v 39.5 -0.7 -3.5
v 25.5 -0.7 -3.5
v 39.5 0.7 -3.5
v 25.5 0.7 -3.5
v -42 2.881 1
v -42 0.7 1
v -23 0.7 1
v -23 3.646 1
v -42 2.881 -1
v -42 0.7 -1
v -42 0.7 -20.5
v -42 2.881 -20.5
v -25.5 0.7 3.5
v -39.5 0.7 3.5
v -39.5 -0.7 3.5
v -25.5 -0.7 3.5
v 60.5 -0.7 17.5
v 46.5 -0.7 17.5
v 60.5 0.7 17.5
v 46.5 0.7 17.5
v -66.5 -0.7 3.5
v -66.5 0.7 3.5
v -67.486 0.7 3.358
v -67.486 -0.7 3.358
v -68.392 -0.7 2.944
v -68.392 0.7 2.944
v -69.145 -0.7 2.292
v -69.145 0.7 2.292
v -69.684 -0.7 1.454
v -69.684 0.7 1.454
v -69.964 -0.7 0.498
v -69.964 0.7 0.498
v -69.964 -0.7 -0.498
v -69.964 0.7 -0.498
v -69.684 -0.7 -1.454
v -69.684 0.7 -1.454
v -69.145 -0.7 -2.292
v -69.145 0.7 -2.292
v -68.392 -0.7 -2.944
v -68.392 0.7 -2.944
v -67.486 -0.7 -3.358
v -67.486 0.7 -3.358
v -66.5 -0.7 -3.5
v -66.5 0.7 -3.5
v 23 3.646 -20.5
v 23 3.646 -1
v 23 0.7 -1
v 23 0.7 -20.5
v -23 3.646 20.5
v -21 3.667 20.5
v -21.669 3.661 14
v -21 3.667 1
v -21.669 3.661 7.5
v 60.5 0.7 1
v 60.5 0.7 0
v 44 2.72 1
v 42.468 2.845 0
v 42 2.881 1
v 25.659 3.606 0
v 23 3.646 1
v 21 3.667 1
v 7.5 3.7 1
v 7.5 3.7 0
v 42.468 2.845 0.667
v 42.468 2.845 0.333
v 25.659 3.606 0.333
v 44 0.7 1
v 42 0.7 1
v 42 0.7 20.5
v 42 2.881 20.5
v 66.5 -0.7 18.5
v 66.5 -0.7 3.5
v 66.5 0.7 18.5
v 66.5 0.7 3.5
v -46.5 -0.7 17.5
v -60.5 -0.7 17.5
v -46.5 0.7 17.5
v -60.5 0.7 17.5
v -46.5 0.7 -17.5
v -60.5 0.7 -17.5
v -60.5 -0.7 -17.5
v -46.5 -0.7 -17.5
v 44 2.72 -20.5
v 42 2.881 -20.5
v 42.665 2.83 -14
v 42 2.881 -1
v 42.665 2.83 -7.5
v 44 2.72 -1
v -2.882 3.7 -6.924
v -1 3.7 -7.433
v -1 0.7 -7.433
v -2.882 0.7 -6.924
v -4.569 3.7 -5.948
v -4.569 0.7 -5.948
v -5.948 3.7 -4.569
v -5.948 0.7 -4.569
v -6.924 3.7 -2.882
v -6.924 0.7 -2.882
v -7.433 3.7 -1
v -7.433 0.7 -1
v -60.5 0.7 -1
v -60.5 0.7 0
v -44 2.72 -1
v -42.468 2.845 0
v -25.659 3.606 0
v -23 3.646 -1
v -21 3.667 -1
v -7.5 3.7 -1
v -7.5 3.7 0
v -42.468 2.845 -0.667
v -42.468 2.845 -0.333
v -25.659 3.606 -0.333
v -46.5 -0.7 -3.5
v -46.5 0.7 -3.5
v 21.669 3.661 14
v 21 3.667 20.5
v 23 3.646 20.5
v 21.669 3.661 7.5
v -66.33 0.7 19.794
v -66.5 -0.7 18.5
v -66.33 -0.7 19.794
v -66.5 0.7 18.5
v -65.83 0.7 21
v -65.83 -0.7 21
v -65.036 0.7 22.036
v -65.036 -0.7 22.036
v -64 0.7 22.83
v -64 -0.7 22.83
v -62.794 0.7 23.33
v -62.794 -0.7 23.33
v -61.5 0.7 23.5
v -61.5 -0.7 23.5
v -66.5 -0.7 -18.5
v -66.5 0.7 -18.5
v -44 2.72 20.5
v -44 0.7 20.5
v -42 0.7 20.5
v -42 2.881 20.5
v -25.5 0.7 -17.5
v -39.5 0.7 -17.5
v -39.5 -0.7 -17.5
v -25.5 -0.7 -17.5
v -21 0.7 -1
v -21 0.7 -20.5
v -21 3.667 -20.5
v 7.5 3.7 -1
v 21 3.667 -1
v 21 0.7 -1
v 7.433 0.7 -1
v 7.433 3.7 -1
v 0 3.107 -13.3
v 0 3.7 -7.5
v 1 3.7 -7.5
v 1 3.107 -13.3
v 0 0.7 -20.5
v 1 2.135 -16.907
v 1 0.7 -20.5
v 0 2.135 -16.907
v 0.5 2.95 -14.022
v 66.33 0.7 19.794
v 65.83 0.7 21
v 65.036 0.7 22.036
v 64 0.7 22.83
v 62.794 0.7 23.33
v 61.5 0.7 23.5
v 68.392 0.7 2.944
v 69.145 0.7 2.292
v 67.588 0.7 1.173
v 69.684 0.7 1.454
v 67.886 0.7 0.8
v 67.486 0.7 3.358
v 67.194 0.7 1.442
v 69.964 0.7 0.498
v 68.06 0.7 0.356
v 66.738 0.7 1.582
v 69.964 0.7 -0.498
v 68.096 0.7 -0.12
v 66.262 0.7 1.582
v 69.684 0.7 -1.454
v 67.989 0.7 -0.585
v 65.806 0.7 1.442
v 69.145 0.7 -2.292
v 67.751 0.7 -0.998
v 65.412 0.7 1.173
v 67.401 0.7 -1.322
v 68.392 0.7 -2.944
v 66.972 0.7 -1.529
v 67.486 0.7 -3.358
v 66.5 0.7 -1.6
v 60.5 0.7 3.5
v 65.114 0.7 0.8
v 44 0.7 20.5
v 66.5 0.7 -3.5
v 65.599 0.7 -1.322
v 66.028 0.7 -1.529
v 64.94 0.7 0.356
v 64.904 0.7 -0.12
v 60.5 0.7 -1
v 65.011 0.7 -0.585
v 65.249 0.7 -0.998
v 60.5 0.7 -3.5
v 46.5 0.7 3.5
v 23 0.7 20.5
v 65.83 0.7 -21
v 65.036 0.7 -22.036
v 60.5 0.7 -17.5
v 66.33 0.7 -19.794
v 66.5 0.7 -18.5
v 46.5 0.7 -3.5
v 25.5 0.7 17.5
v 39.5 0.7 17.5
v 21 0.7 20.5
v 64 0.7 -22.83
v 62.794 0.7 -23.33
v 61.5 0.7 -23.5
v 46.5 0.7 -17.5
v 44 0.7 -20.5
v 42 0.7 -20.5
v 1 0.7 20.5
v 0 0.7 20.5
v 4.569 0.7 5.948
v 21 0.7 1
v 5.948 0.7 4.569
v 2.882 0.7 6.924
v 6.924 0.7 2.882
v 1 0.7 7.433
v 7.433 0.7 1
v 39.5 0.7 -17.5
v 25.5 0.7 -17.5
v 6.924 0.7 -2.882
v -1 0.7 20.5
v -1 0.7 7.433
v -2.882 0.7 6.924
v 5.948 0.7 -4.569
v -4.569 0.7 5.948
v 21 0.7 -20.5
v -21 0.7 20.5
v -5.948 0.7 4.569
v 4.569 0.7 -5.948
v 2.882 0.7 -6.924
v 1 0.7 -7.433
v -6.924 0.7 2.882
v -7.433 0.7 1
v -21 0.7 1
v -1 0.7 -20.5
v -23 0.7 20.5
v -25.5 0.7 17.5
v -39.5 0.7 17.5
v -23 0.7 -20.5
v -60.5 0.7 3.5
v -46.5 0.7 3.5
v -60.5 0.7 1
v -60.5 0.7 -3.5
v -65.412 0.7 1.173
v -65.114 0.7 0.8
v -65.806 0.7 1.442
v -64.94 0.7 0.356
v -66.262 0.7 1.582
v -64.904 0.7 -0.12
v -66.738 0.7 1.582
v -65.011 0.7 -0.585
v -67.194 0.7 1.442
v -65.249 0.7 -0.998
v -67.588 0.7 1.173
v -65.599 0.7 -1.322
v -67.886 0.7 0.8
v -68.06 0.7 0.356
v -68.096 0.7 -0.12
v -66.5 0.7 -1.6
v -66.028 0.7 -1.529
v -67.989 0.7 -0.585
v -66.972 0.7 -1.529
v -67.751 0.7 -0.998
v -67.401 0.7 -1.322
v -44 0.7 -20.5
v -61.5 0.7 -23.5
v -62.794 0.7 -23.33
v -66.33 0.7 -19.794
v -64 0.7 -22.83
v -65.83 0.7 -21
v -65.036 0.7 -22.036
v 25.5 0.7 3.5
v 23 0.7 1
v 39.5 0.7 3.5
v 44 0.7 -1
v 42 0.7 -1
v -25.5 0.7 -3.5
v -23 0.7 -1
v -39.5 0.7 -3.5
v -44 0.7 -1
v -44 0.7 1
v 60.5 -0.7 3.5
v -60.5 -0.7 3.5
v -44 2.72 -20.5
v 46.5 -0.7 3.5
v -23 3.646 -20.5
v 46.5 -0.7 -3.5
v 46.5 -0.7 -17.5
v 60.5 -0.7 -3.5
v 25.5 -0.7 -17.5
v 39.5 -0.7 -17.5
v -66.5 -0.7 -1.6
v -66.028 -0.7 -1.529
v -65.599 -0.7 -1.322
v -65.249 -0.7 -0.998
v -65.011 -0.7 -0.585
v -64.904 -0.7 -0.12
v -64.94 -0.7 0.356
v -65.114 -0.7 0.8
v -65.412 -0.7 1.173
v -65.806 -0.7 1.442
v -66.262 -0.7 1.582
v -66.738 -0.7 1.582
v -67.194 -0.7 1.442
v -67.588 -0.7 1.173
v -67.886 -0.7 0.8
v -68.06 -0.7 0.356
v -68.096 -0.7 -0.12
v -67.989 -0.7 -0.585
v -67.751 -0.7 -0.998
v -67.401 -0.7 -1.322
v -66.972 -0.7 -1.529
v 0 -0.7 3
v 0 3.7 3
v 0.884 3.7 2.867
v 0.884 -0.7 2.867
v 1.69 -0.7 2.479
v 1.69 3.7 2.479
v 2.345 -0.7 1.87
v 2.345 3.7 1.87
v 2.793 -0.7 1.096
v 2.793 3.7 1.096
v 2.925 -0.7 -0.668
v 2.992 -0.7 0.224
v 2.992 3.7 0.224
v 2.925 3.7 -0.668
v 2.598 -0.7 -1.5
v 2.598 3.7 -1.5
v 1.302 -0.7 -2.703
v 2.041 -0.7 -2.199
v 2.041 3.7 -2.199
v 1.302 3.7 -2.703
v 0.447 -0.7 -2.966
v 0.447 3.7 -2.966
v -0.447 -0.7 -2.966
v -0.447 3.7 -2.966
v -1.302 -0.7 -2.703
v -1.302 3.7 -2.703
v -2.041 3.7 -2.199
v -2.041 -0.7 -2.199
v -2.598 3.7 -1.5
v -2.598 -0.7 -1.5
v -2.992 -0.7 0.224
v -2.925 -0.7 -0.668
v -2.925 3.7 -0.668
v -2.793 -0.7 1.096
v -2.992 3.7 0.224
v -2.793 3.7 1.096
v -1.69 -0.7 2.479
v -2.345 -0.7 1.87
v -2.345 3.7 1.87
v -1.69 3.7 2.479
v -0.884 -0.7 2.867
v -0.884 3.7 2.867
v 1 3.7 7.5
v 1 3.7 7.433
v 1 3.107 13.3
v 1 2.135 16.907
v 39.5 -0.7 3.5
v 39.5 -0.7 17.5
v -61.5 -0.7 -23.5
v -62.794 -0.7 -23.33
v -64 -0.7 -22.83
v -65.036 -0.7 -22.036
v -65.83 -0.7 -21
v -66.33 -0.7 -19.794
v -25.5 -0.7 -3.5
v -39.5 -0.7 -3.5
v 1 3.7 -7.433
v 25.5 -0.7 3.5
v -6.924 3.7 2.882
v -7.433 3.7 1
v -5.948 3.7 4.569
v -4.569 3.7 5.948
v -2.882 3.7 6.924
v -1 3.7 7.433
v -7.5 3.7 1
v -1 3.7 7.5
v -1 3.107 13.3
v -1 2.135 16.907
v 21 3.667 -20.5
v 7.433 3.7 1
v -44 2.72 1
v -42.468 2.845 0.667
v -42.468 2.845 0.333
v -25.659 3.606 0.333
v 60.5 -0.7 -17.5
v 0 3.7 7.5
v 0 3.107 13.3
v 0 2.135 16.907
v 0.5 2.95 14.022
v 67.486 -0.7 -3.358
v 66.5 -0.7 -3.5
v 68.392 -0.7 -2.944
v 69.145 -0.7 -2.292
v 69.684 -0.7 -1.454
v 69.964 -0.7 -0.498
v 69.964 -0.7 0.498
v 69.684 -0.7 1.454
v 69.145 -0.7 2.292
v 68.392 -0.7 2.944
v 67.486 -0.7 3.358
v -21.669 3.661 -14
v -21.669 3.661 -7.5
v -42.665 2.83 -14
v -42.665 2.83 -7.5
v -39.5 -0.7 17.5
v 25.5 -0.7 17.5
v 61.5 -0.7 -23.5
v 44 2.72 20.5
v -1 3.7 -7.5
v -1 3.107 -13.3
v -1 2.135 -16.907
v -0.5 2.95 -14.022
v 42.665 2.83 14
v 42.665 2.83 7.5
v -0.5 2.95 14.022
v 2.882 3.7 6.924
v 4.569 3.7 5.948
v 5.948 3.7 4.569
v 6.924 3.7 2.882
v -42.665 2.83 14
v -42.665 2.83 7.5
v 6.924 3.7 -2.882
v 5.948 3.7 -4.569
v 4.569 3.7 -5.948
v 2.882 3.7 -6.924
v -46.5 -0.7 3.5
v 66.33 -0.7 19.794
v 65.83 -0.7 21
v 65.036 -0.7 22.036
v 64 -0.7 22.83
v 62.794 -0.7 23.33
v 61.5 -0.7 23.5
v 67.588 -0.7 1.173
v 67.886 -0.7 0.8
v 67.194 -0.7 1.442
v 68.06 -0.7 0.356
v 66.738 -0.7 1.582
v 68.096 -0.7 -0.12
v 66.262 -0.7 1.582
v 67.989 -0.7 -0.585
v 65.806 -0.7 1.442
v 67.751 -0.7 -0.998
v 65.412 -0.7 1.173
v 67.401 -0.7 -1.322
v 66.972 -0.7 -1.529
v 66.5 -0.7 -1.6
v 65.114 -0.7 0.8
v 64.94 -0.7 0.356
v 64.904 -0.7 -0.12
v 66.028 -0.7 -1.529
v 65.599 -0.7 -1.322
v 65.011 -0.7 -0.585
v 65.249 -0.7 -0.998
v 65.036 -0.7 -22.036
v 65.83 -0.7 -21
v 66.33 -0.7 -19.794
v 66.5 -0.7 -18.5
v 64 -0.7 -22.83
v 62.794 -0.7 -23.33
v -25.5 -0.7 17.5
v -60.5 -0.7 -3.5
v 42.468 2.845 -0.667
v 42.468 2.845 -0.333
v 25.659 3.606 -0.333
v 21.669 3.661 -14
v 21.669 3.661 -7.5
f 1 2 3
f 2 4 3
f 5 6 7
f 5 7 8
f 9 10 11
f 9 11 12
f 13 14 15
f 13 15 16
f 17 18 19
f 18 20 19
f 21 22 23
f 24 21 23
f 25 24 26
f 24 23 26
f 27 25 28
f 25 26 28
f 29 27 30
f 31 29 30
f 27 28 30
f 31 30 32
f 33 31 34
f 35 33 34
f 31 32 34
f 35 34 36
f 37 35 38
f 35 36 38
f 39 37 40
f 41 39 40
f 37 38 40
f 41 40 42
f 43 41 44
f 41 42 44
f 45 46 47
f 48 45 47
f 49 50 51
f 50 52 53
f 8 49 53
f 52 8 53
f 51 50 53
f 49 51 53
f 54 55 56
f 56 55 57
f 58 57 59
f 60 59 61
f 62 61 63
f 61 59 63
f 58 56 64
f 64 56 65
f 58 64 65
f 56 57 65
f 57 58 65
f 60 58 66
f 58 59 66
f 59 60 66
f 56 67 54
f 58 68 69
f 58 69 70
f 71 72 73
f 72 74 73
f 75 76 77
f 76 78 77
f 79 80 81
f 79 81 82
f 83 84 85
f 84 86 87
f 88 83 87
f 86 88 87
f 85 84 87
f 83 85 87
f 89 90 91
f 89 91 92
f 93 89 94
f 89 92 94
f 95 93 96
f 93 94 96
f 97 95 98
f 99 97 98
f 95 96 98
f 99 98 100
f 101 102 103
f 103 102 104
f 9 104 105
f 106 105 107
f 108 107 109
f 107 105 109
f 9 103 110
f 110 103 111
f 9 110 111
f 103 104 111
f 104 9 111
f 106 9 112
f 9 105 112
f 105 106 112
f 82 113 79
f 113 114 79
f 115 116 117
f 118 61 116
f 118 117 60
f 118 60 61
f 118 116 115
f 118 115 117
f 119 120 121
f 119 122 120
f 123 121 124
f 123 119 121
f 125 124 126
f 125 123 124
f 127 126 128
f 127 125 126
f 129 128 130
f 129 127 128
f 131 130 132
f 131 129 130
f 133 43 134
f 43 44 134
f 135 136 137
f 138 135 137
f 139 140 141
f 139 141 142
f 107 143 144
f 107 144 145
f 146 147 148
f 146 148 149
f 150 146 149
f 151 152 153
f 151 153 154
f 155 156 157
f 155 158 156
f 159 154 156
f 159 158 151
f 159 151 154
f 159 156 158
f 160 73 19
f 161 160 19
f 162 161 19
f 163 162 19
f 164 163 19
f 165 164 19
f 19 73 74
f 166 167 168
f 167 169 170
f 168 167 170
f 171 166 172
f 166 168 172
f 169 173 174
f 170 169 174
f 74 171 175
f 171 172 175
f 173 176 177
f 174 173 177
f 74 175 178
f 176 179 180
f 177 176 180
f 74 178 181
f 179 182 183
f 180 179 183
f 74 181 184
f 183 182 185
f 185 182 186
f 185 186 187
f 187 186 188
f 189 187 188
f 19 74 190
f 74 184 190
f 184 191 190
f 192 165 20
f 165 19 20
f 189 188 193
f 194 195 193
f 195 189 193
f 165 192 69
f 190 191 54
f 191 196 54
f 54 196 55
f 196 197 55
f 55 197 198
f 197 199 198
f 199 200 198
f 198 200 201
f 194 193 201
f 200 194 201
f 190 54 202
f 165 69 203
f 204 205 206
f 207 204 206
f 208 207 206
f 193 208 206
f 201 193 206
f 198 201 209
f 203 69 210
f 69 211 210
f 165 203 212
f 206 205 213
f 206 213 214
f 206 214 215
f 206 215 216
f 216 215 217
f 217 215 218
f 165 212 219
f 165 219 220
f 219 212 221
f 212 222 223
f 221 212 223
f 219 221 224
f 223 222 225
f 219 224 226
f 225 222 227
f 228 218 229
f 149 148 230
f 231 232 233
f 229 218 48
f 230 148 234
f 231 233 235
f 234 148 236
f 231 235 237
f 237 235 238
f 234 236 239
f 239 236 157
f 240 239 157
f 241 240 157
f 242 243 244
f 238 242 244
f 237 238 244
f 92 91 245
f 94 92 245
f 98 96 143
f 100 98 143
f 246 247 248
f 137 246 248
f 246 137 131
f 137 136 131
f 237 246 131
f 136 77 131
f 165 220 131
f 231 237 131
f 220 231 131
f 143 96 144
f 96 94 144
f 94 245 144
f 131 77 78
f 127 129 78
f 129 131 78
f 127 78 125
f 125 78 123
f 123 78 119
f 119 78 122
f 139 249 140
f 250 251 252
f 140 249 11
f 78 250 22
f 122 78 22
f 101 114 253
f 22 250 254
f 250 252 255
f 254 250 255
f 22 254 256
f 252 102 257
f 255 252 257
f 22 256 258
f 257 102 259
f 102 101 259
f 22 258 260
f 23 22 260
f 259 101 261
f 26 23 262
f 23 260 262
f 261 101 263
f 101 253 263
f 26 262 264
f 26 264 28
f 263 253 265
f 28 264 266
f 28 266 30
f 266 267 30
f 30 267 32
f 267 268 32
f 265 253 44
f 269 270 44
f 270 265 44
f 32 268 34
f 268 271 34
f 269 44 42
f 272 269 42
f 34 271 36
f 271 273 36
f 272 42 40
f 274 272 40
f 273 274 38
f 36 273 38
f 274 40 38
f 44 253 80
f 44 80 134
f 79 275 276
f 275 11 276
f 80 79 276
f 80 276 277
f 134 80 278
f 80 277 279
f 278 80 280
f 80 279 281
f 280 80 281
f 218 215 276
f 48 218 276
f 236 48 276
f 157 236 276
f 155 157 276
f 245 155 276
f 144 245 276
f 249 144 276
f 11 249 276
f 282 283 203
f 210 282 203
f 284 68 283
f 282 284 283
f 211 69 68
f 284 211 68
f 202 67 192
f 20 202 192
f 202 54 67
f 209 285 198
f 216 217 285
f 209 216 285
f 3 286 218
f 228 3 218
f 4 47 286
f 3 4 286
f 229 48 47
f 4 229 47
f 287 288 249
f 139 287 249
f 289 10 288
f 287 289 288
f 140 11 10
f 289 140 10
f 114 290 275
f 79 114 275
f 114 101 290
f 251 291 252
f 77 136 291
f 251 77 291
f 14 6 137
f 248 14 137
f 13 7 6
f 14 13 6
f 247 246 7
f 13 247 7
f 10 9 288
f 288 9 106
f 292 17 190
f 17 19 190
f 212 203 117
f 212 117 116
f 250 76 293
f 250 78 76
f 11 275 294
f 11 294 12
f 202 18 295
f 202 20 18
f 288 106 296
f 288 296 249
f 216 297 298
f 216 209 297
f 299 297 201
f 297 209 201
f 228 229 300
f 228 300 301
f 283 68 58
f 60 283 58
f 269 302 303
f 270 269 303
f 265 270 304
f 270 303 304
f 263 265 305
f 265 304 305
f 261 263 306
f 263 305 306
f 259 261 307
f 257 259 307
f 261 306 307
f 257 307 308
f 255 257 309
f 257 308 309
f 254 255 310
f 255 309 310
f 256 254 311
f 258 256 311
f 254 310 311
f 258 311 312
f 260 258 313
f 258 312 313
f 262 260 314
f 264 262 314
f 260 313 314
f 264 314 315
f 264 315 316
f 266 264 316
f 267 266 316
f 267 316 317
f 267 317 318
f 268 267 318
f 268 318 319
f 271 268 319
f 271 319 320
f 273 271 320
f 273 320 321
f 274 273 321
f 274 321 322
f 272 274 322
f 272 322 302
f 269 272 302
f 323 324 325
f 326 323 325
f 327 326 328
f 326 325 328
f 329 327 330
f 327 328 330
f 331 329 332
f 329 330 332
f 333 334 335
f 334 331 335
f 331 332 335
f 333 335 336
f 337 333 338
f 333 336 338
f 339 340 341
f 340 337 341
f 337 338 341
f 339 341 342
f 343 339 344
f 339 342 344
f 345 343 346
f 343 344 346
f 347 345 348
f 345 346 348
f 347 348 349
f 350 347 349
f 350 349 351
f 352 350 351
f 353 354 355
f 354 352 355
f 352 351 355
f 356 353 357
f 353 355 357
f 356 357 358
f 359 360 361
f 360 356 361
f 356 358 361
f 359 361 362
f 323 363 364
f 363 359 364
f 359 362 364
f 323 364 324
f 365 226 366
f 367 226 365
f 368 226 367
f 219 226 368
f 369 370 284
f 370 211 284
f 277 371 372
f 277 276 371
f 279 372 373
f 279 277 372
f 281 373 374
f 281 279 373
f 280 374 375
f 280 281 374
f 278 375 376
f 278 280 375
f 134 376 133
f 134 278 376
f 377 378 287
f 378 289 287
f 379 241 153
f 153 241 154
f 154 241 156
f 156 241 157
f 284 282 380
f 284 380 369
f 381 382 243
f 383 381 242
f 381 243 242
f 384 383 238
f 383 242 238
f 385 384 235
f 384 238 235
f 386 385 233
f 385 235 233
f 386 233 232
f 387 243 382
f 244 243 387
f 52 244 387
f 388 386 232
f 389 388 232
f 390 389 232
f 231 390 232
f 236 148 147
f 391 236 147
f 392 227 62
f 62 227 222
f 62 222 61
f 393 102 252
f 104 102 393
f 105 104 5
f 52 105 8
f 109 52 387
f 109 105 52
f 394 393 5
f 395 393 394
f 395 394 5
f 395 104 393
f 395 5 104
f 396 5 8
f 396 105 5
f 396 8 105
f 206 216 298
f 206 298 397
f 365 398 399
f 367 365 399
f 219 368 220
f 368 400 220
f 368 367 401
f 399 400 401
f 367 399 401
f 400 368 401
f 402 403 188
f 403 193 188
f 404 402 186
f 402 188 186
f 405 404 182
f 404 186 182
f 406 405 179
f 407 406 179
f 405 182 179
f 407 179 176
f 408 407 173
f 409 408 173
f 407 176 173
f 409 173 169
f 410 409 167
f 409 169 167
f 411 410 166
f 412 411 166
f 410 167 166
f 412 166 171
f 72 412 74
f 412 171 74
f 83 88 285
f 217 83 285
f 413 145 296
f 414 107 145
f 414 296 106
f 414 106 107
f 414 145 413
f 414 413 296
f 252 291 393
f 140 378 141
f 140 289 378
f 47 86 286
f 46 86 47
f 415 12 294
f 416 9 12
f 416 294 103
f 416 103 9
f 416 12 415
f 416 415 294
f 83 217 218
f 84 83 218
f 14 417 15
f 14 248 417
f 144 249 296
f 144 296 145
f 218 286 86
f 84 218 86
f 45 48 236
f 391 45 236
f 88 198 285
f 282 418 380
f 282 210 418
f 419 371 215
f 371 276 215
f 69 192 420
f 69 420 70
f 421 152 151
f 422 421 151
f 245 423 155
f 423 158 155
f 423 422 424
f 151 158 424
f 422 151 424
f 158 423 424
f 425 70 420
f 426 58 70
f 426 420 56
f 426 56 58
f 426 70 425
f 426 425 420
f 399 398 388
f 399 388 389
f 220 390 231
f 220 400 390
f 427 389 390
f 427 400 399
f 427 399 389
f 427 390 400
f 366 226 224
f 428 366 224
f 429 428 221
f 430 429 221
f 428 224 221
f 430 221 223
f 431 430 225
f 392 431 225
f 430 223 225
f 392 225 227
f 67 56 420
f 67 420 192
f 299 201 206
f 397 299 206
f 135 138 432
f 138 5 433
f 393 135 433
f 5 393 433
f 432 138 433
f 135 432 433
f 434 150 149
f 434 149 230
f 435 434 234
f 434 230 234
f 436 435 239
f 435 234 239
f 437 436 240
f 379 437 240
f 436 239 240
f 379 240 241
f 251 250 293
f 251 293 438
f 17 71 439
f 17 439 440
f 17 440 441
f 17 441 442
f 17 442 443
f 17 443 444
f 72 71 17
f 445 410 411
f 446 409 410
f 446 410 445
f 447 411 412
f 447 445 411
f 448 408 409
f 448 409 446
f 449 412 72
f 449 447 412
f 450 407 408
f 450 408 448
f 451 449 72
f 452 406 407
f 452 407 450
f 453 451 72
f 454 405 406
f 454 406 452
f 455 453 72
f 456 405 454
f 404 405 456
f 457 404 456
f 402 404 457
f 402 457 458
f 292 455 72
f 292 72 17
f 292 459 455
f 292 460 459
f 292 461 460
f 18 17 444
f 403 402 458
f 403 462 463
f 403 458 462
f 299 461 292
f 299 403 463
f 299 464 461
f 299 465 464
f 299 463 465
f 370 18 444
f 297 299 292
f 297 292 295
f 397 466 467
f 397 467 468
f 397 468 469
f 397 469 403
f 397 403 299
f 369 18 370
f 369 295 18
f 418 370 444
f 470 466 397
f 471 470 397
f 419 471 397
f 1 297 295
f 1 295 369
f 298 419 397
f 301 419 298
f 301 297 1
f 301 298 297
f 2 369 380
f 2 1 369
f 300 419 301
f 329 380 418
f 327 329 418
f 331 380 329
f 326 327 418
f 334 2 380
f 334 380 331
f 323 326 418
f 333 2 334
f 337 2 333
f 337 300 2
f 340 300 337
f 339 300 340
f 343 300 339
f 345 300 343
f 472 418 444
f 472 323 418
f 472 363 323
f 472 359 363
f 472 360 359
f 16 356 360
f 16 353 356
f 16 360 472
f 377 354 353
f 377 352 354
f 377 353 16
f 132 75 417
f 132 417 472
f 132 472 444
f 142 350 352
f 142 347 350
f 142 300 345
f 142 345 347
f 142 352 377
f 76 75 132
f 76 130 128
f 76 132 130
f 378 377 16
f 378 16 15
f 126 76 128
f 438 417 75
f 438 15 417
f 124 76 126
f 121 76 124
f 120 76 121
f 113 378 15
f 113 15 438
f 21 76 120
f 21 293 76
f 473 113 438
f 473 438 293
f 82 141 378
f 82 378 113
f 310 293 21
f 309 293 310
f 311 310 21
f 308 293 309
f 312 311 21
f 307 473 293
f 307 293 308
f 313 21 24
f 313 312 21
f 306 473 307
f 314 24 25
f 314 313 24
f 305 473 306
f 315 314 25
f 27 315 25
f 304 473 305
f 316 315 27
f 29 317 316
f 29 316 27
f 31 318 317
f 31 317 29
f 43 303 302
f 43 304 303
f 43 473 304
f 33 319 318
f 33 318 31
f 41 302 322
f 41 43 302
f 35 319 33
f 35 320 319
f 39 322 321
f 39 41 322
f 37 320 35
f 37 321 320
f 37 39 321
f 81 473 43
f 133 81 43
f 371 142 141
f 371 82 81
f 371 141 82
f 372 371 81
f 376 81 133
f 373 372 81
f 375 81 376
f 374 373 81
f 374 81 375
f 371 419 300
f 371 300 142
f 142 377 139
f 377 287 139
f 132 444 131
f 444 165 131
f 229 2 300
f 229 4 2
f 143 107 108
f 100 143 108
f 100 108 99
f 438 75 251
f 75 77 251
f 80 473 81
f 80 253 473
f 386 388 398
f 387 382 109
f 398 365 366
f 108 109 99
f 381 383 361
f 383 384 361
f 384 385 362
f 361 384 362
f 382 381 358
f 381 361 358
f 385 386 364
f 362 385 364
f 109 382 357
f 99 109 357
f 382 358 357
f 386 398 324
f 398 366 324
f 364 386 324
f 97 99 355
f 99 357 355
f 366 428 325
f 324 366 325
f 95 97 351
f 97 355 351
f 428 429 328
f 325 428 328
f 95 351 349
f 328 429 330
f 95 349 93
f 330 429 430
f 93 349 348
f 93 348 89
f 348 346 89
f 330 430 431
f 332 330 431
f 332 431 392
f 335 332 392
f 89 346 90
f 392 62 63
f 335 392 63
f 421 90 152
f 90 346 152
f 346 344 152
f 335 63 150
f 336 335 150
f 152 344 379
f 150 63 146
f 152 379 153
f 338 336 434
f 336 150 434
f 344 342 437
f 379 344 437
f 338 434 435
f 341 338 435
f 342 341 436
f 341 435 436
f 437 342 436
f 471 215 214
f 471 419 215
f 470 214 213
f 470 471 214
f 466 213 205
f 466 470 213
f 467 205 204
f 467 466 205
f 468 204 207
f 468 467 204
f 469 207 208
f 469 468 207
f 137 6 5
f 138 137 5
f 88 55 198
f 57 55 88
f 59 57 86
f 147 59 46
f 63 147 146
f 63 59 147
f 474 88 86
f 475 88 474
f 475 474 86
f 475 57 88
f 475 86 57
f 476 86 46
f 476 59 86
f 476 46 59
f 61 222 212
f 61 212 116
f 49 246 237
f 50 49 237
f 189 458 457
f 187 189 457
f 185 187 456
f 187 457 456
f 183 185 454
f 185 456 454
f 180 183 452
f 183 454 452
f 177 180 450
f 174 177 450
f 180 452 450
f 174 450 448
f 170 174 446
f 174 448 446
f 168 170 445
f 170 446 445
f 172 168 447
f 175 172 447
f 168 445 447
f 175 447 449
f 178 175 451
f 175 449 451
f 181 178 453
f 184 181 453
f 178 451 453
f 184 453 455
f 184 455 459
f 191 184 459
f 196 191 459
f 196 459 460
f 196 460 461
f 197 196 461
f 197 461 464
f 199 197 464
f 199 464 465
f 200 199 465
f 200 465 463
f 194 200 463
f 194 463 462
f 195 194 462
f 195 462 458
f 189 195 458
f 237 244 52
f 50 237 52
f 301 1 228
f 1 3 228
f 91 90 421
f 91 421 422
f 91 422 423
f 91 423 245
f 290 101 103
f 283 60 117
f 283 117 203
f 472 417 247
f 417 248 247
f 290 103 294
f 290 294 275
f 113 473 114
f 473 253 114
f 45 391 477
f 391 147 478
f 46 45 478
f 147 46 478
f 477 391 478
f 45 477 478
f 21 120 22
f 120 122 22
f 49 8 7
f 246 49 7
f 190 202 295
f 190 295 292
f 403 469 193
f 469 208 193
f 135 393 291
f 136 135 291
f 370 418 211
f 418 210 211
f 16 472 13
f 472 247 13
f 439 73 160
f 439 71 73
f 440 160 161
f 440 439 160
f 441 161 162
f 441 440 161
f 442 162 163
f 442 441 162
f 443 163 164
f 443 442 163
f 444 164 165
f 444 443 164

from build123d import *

# Parameters (mm, degrees)
SKETCH1_W            = 14
SKETCH1_H            = 14
BOSS_EXTRUDE1_DEPTH  = 0.7
SKETCH10_R           = 7.5
BOSS_EXTRUDE8_DEPTH  = 3
BOSS_EXTRUDE17_DEPTH = 1
SKETCH24_R           = 3
CUT_EXTRUDE5_DEPTH   = 74.970331891
SKETCH21_W           = 2
SKETCH21_H           = 3
BOSS_EXTRUDE20_DEPTH = 0.066966
BOSS_EXTRUDE22_DEPTH = 1
SKETCH26_W           = 2
SKETCH26_H           = 3
BOSS_EXTRUDE23_DEPTH = 0.066966
BOSS_EXTRUDE24_START = 1
BOSS_EXTRUDE24_DEPTH = 19.5
BOSS_EXTRUDE25_START = 1
BOSS_EXTRUDE25_DEPTH = 19.5
SKETCH30_R           = 1.6
CUT_EXTRUDE6_DEPTH   = 74.970342046
FILLET2_R            = 5


# Read off the part's stored shape, not the designer's step: Boss-Extrude24, Boss-Extrude25
with BuildPart() as part:
    # Sketch1 → Boss-Extrude1 (new, symmetric)
    with BuildSketch(Plane(origin=(0, 0, 0), x_dir=(1, 0, 0), z_dir=(0, 1, 0))):
        with BuildLine():
            Line((-66.5, 23.5), (66.5, 23.5))
            Line((66.5, 23.5), (66.5, 3.5))
            ThreePointArc((66.5, 3.5), (70, 0), (66.5, -3.5))
            Line((66.5, -3.5), (66.5, -23.5))
            Line((66.5, -23.5), (-66.5, -23.5))
            Line((-66.5, -23.5), (-66.5, -3.5))
            ThreePointArc((-66.5, -3.5), (-70, 0), (-66.5, 3.5))
            Line((-66.5, 3.5), (-66.5, 23.5))
        make_face()
        with Locations((-53.5, 10.5)):
            Rectangle(SKETCH1_W, SKETCH1_H, mode=Mode.SUBTRACT)
        with Locations((32.5, -10.5)):
            Rectangle(SKETCH1_W, SKETCH1_H, mode=Mode.SUBTRACT)
        with Locations((-53.5, -10.5)):
            Rectangle(SKETCH1_W, SKETCH1_H, mode=Mode.SUBTRACT)
        with Locations((-32.5, -10.5)):
            Rectangle(SKETCH1_W, SKETCH1_H, mode=Mode.SUBTRACT)
        with Locations((-32.5, 10.5)):
            Rectangle(SKETCH1_W, SKETCH1_H, mode=Mode.SUBTRACT)
        with Locations((53.5, -10.5)):
            Rectangle(SKETCH1_W, SKETCH1_H, mode=Mode.SUBTRACT)
        with Locations((32.5, 10.5)):
            Rectangle(SKETCH1_W, SKETCH1_H, mode=Mode.SUBTRACT)
        with Locations((53.5, 10.5)):
            Rectangle(SKETCH1_W, SKETCH1_H, mode=Mode.SUBTRACT)
    extrude(amount=BOSS_EXTRUDE1_DEPTH, both=True)

    # Sketch10 → Boss-Extrude8 (add)
    with BuildSketch(Plane(origin=(0, 0.7, 0), x_dir=(1, 0, 0), z_dir=(0, 1, 0))):
        with Locations(Location((0, 0, 0), (0, 0, 270))):
            Circle(SKETCH10_R)
    extrude(amount=BOSS_EXTRUDE8_DEPTH)

    # Sketch24 → Cut-Extrude5 (cut, through all)
    with BuildSketch(Plane(origin=(0, 3.7, 0), x_dir=(1, 0, 0), z_dir=(0, 1, 0))):
        with Locations(Location((0, 0, 0), (0, 0, 270))):
            Circle(SKETCH24_R)
    extrude(amount=-CUT_EXTRUDE5_DEPTH, mode=Mode.SUBTRACT)



with BuildPart() as body_2:
    # Sketch20 → Boss-Extrude17 (new, symmetric)
    with BuildSketch(Plane(origin=(0, 0, 0), x_dir=(0, 0, -1), z_dir=(1, 0, 0))):
        with BuildLine():
            Line((-7.5, 0.7), (-20.5, 0.7))
            add(Edge.make_bspline(
                [(-7.5, 3.7), (-14.044942682, 3.7), (-20.5, 0.7)],
                knots=[0, 0, 0, 1, 1, 1], degree=2))
            Line((-7.5, 3.7), (-7.5, 0.7))
        make_face()
    extrude(amount=BOSS_EXTRUDE17_DEPTH, both=True)


with BuildPart() as part_1:
    add(part.part)

    add(body_2.part)  # Boss-Extrude20 merges body 2
    # Sketch21 → Boss-Extrude20 (add)
    with BuildSketch(Plane(origin=(0, 0, 7.5), x_dir=(-1, 0, 0), z_dir=(0, 0, -1))):
        with Locations((0, 2.2)):
            Rectangle(SKETCH21_W, SKETCH21_H)
    extrude(amount=BOSS_EXTRUDE20_DEPTH)

    # Mirror8: part across plane


with BuildPart() as part_2:
    add(part_1.part)
    add(part_1.part.mirror(Plane.XY))



with BuildPart() as body_2_2:
    # Sketch15 → Boss-Extrude22 (new, symmetric)
    with BuildSketch(Plane.XY):
        with BuildLine():
            Line((-7.5, 0.7), (-7.5, 3.7))
            add(Edge.make_bspline(
                [(-60.5, 0.7), (-40.998326872, 3.776331264), (-27.192073984, 3.7), (-7.5, 3.7)],
                knots=[0, 0, 0, 0, 1, 1, 1, 1], degree=3))
            Line((-60.5, 0.7), (-7.5, 0.7))
        make_face()
    extrude(amount=BOSS_EXTRUDE22_DEPTH, both=True)


with BuildPart() as part_3:
    add(part_2.part)

    add(body_2_2.part)  # Boss-Extrude23 merges body 2 2
    # Sketch26 → Boss-Extrude23 (add)
    with BuildSketch(Plane(origin=(-7.5, 0, 0), x_dir=(0, 0, -1), z_dir=(1, 0, 0))):
        with Locations((0, 2.2)):
            Rectangle(SKETCH26_W, SKETCH26_H)
    extrude(amount=BOSS_EXTRUDE23_DEPTH)


with BuildPart() as body_2_3:
    # Boss-Extrude24 outline → Boss-Extrude24 (new body)
    with BuildSketch(Plane.XY.offset(BOSS_EXTRUDE24_START)):
        with BuildLine():
            Line((-42, 0.7), (-41.999999997, 2.881262224))
            add(Edge.make_bspline(
                [(-41.999999997, 2.881262224), (-42.663786895, 2.830556642), (-43.330222071, 2.776715505), (-44, 2.719545184)],
                knots=[0.657479323, 0.657479323, 0.657479323, 0.657479323, 0.696620492, 0.696620492, 0.696620492, 0.696620492], degree=3))
            Line((-44, 2.719545184), (-44, 0.7))
            Line((-44, 0.7), (-42, 0.7))
        make_face()
    extrude(amount=BOSS_EXTRUDE24_DEPTH)


with BuildPart() as body_3:
    # Mirror9: mirrored copy
    add(body_2_3.part.mirror(Plane.XY))


with BuildPart() as body_4:
    # Boss-Extrude25 outline → Boss-Extrude25 (new body)
    with BuildSketch(Plane.XY.offset(BOSS_EXTRUDE25_START)):
        with BuildLine():
            Line((-21, 0.7), (-21, 3.667005238))
            add(Edge.make_bspline(
                [(-21, 3.667005238), (-21.670951218, 3.66109998), (-22.337400803, 3.65415318), (-23.000000006, 3.645983261)],
                knots=[0.243398828, 0.243398828, 0.243398828, 0.243398828, 0.281710487, 0.281710487, 0.281710487, 0.281710487], degree=3))
            Line((-23.000000006, 3.645983261), (-23, 0.7))
            Line((-23, 0.7), (-21, 0.7))
        make_face()
    extrude(amount=BOSS_EXTRUDE25_DEPTH)


with BuildPart() as body_5:
    # Mirror10: mirrored copy
    add(body_4.part.mirror(Plane.XY))


with BuildPart() as body_6:
    # Mirror17: mirrored copy
    add(part_3.part.mirror(Plane(origin=(0, 0, 0), x_dir=(0, 0, 1), z_dir=(1, 0, 0))))


with BuildPart() as body_7:
    # Mirror17 2: mirrored copy
    add(body_4.part.mirror(Plane(origin=(0, 0, 0), x_dir=(0, 0, 1), z_dir=(1, 0, 0))))


with BuildPart() as body_8:
    # Mirror17 3: mirrored copy
    add(body_5.part.mirror(Plane(origin=(0, 0, 0), x_dir=(0, 0, 1), z_dir=(1, 0, 0))))


with BuildPart() as body_9:
    # Mirror17 4: mirrored copy
    add(body_3.part.mirror(Plane(origin=(0, 0, 0), x_dir=(0, 0, 1), z_dir=(1, 0, 0))))


with BuildPart() as body_10:
    # Mirror17 5: mirrored copy
    add(body_2_3.part.mirror(Plane(origin=(0, 0, 0), x_dir=(0, 0, 1), z_dir=(1, 0, 0))))


with BuildPart() as cut_extrude6_tool:
    # Sketch30 → Cut-Extrude6 (new, through all)
    with BuildSketch(Plane.XZ.offset(0.7)):
        with Locations(Location((-66.5, 0, 0), (0, 0, 270))):
            Circle(SKETCH30_R)
        with Locations(Location((66.5, 0, 0), (0, 0, 270))):
            Circle(SKETCH30_R)
    extrude(amount=-CUT_EXTRUDE6_DEPTH)


with BuildPart() as part_4:
    add(part_3.part)

    # Cut-Extrude6: cut by cut_extrude6_tool
    add(cut_extrude6_tool.part, mode=Mode.SUBTRACT)


with BuildPart() as body_6_1:
    add(body_6.part)

    # Cut-Extrude6: cut by cut_extrude6_tool
    add(cut_extrude6_tool.part, mode=Mode.SUBTRACT)


with BuildPart() as body_7_1:
    add(body_7.part)

    # Combine1: union body 3, body 10, body 4, part, body 2 3, body 9, body 6, body 8, body 5
    add(body_3.part)
    add(body_10.part)
    add(body_4.part)
    add(part_4.part)
    add(body_2_3.part)
    add(body_9.part)
    add(body_6_1.part)
    add(body_8.part)
    add(body_5.part)

    # Fillet2
    fillet2_edges = [body_7_1.edges().sort_by_distance(p)[0] for p in [
        (-66.5, 0, -23.5),
        (-66.5, 0, 23.5),
        (66.5, 0, 23.5),
        (66.5, 0, -23.5),
    ]]
    fillet(fillet2_edges, radius=FILLET2_R)


solid = body_7_1.part
